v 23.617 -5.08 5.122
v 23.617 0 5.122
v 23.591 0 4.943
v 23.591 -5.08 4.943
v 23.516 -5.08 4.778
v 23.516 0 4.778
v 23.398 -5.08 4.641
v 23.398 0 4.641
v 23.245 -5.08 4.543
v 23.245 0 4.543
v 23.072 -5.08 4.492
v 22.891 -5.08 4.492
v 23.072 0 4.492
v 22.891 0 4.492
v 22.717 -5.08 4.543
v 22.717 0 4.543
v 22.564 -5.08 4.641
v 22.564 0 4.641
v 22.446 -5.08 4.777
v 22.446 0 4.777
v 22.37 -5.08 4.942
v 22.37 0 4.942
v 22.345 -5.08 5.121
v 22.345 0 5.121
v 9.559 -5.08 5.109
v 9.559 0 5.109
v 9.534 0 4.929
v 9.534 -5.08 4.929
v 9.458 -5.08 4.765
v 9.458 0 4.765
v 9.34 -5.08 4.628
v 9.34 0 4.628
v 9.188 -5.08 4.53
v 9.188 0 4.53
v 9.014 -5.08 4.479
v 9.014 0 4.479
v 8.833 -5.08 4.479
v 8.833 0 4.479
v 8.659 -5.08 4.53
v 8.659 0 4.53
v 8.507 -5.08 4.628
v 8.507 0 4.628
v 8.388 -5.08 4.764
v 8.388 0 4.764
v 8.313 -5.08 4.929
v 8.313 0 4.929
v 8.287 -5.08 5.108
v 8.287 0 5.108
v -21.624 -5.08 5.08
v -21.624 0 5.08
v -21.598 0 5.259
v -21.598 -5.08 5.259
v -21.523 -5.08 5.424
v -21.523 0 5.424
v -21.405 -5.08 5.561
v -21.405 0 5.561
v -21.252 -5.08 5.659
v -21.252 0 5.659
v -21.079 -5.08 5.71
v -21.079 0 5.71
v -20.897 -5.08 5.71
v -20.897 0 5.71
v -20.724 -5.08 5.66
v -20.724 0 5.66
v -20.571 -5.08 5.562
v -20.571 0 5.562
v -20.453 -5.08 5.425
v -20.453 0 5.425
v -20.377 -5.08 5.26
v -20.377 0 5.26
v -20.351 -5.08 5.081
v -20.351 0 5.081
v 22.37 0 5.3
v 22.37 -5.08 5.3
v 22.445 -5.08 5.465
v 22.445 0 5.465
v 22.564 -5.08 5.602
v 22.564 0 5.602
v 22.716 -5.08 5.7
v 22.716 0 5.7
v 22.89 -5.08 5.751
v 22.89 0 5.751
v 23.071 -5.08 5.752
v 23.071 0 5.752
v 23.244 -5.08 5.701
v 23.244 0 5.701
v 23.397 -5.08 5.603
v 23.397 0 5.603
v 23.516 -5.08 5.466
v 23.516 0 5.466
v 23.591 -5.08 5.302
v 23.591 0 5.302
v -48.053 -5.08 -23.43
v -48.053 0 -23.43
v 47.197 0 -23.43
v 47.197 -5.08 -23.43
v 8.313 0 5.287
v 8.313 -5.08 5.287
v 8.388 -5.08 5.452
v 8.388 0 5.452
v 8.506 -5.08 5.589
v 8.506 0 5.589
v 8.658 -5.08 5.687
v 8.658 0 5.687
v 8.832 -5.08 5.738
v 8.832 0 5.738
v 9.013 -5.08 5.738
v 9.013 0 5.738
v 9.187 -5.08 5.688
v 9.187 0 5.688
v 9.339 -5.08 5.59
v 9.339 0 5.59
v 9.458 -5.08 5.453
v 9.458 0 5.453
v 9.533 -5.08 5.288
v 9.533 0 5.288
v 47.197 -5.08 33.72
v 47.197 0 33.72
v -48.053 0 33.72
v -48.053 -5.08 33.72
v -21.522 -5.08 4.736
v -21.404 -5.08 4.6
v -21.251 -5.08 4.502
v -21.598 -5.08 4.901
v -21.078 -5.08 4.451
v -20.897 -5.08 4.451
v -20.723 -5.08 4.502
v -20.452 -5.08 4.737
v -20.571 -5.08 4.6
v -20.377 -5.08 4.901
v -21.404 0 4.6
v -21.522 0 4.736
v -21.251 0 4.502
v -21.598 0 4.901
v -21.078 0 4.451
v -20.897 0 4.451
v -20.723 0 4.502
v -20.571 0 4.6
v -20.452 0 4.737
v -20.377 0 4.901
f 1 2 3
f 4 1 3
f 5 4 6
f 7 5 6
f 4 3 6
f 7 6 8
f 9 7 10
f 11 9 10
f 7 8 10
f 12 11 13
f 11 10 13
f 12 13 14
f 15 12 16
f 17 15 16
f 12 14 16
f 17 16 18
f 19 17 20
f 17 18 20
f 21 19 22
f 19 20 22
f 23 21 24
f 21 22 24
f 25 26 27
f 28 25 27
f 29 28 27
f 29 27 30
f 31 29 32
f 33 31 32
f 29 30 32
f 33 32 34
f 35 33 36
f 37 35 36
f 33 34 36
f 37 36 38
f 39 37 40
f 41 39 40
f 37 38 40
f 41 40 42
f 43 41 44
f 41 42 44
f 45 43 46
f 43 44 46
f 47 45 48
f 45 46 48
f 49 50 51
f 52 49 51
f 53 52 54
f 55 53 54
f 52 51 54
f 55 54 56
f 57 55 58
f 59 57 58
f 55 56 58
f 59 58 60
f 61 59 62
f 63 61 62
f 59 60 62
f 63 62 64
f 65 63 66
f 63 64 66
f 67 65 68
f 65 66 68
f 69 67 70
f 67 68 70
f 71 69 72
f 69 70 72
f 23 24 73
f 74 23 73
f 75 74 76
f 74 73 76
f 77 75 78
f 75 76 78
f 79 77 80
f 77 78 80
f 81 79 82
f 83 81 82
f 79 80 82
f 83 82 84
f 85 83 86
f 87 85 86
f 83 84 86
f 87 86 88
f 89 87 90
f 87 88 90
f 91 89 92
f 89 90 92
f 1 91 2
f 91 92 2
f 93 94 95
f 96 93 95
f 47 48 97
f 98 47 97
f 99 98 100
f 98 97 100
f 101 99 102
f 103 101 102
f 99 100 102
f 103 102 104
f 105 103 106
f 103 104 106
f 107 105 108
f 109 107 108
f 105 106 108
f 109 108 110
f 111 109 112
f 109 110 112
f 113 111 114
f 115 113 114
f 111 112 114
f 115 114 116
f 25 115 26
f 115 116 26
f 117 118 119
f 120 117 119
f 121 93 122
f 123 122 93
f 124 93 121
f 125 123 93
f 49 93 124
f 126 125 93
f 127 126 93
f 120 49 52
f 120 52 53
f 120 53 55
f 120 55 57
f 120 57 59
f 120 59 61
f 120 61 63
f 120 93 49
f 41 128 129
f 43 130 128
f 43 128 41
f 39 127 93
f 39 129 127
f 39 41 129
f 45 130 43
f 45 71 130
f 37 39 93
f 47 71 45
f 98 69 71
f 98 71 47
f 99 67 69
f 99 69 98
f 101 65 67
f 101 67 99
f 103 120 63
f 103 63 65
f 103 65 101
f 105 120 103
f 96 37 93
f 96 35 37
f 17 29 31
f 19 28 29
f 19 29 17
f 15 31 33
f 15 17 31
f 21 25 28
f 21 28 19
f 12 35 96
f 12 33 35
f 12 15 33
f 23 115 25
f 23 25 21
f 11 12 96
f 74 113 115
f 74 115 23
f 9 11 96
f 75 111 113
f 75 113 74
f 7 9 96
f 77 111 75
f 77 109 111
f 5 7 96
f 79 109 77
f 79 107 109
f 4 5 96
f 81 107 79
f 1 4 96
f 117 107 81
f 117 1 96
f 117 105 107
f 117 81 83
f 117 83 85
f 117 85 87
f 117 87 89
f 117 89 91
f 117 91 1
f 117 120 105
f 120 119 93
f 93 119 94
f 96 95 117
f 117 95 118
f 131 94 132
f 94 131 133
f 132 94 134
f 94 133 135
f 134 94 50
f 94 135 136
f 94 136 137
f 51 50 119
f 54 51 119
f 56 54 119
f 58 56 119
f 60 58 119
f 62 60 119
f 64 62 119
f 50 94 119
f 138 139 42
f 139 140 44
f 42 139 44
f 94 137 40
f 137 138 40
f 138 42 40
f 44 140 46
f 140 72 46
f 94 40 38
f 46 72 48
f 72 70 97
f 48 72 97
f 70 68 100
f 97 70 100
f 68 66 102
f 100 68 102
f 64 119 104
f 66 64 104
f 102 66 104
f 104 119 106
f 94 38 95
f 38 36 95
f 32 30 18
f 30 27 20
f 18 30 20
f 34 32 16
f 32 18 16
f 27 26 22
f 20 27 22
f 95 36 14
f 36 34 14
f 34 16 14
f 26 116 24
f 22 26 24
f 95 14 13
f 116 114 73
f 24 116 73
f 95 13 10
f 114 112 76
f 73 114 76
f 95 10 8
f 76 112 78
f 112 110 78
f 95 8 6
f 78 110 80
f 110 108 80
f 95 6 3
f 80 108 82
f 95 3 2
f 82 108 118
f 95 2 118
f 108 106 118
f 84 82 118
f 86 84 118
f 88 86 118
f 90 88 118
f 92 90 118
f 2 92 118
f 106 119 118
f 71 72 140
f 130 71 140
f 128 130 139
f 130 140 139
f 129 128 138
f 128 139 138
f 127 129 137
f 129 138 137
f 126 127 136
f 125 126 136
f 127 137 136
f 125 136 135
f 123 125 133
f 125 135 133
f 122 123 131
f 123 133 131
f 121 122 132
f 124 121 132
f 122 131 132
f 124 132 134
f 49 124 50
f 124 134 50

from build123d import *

# Parameters (mm, degrees)
F1_DEPTH = 5.08


with BuildPart() as f1:
    # F0 (on Front) → F1 (new body)
    with BuildSketch(Plane.XZ):
        with BuildLine():
            Line((-22.6528607666, 33.7195000469), (-48.0528607666, 33.7195000469))
            Line((-48.0528607666, 33.7195000469), (-48.0528607666, 13.0820000469))
            Line((-48.0528607666, 13.0820000469), (-48.0528607666, 5.0553071935))
            Line((-48.0528607666, 5.0553071935), (-21.6236447839, 5.0800557204))
            ThreePointArc((-21.6236447839, 5.0800557204), (-20.9880244621, 5.7168675577), (-20.3512126248, 5.081247236))
            Line((-20.3512126248, 5.081247236), (8.2869998682, 5.1080642847))
            ThreePointArc((8.2869998682, 5.1080642847), (8.9226201899, 5.744876122), (9.5594320273, 5.1092558002))
            Line((9.5594320273, 5.1092558002), (22.3445299864, 5.1212278671))
            ThreePointArc((22.3445299864, 5.1212278671), (22.9801503081, 5.7580397044), (23.6169621455, 5.1224193826))
            Line((23.6169621455, 5.1224193826), (47.1971392334, 5.1445000469))
            Line((47.1971392334, 5.1445000469), (47.1971392334, 33.7195000469))
            Line((47.1971392334, 33.7195000469), (20.2096392334, 33.7195000469))
            Line((20.2096392334, 33.7195000469), (5.9221392334, 33.7195000469))
            Line((5.9221392334, 33.7195000469), (-22.6528607666, 33.7195000469))
        make_face()
        with BuildLine():
            Line((-21.6236447839, 5.0800557204), (-48.0528607666, 5.0553071935))
            Line((-48.0528607666, 5.0553071935), (-48.0528607666, -1.2054999531))
            Line((-48.0528607666, -1.2054999531), (-48.0528607666, -23.4304999531))
            Line((-48.0528607666, -23.4304999531), (47.1971392334, -23.4304999531))
            Line((47.1971392334, -23.4304999531), (47.1971392334, 5.1445000469))
            Line((47.1971392334, 5.1445000469), (23.6169621455, 5.1224193826))
            ThreePointArc((23.6169621455, 5.1224193826), (23.6169623547, 5.1221215037), (23.6169624244, 5.1218236248))
            ThreePointArc((23.6169624244, 5.1218236248), (22.9810439448, 4.4856073361), (22.3445299864, 5.1212278671))
            Line((22.3445299864, 5.1212278671), (9.5594320273, 5.1092558002))
            ThreePointArc((9.5594320273, 5.1092558002), (9.5594322365, 5.1089579214), (9.5594323062, 5.1086600424))
            ThreePointArc((9.5594323062, 5.1086600424), (8.9235138266, 4.4724437537), (8.2869998682, 5.1080642847))
            Line((8.2869998682, 5.1080642847), (-20.3512126248, 5.081247236))
            ThreePointArc((-20.3512126248, 5.081247236), (-20.3512124156, 5.0809493571), (-20.3512123459, 5.0806514782))
            ThreePointArc((-20.3512123459, 5.0806514782), (-20.9871308254, 4.4444351895), (-21.6236447839, 5.0800557204))
        make_face()
    extrude(amount=F1_DEPTH)


solid = f1.part
